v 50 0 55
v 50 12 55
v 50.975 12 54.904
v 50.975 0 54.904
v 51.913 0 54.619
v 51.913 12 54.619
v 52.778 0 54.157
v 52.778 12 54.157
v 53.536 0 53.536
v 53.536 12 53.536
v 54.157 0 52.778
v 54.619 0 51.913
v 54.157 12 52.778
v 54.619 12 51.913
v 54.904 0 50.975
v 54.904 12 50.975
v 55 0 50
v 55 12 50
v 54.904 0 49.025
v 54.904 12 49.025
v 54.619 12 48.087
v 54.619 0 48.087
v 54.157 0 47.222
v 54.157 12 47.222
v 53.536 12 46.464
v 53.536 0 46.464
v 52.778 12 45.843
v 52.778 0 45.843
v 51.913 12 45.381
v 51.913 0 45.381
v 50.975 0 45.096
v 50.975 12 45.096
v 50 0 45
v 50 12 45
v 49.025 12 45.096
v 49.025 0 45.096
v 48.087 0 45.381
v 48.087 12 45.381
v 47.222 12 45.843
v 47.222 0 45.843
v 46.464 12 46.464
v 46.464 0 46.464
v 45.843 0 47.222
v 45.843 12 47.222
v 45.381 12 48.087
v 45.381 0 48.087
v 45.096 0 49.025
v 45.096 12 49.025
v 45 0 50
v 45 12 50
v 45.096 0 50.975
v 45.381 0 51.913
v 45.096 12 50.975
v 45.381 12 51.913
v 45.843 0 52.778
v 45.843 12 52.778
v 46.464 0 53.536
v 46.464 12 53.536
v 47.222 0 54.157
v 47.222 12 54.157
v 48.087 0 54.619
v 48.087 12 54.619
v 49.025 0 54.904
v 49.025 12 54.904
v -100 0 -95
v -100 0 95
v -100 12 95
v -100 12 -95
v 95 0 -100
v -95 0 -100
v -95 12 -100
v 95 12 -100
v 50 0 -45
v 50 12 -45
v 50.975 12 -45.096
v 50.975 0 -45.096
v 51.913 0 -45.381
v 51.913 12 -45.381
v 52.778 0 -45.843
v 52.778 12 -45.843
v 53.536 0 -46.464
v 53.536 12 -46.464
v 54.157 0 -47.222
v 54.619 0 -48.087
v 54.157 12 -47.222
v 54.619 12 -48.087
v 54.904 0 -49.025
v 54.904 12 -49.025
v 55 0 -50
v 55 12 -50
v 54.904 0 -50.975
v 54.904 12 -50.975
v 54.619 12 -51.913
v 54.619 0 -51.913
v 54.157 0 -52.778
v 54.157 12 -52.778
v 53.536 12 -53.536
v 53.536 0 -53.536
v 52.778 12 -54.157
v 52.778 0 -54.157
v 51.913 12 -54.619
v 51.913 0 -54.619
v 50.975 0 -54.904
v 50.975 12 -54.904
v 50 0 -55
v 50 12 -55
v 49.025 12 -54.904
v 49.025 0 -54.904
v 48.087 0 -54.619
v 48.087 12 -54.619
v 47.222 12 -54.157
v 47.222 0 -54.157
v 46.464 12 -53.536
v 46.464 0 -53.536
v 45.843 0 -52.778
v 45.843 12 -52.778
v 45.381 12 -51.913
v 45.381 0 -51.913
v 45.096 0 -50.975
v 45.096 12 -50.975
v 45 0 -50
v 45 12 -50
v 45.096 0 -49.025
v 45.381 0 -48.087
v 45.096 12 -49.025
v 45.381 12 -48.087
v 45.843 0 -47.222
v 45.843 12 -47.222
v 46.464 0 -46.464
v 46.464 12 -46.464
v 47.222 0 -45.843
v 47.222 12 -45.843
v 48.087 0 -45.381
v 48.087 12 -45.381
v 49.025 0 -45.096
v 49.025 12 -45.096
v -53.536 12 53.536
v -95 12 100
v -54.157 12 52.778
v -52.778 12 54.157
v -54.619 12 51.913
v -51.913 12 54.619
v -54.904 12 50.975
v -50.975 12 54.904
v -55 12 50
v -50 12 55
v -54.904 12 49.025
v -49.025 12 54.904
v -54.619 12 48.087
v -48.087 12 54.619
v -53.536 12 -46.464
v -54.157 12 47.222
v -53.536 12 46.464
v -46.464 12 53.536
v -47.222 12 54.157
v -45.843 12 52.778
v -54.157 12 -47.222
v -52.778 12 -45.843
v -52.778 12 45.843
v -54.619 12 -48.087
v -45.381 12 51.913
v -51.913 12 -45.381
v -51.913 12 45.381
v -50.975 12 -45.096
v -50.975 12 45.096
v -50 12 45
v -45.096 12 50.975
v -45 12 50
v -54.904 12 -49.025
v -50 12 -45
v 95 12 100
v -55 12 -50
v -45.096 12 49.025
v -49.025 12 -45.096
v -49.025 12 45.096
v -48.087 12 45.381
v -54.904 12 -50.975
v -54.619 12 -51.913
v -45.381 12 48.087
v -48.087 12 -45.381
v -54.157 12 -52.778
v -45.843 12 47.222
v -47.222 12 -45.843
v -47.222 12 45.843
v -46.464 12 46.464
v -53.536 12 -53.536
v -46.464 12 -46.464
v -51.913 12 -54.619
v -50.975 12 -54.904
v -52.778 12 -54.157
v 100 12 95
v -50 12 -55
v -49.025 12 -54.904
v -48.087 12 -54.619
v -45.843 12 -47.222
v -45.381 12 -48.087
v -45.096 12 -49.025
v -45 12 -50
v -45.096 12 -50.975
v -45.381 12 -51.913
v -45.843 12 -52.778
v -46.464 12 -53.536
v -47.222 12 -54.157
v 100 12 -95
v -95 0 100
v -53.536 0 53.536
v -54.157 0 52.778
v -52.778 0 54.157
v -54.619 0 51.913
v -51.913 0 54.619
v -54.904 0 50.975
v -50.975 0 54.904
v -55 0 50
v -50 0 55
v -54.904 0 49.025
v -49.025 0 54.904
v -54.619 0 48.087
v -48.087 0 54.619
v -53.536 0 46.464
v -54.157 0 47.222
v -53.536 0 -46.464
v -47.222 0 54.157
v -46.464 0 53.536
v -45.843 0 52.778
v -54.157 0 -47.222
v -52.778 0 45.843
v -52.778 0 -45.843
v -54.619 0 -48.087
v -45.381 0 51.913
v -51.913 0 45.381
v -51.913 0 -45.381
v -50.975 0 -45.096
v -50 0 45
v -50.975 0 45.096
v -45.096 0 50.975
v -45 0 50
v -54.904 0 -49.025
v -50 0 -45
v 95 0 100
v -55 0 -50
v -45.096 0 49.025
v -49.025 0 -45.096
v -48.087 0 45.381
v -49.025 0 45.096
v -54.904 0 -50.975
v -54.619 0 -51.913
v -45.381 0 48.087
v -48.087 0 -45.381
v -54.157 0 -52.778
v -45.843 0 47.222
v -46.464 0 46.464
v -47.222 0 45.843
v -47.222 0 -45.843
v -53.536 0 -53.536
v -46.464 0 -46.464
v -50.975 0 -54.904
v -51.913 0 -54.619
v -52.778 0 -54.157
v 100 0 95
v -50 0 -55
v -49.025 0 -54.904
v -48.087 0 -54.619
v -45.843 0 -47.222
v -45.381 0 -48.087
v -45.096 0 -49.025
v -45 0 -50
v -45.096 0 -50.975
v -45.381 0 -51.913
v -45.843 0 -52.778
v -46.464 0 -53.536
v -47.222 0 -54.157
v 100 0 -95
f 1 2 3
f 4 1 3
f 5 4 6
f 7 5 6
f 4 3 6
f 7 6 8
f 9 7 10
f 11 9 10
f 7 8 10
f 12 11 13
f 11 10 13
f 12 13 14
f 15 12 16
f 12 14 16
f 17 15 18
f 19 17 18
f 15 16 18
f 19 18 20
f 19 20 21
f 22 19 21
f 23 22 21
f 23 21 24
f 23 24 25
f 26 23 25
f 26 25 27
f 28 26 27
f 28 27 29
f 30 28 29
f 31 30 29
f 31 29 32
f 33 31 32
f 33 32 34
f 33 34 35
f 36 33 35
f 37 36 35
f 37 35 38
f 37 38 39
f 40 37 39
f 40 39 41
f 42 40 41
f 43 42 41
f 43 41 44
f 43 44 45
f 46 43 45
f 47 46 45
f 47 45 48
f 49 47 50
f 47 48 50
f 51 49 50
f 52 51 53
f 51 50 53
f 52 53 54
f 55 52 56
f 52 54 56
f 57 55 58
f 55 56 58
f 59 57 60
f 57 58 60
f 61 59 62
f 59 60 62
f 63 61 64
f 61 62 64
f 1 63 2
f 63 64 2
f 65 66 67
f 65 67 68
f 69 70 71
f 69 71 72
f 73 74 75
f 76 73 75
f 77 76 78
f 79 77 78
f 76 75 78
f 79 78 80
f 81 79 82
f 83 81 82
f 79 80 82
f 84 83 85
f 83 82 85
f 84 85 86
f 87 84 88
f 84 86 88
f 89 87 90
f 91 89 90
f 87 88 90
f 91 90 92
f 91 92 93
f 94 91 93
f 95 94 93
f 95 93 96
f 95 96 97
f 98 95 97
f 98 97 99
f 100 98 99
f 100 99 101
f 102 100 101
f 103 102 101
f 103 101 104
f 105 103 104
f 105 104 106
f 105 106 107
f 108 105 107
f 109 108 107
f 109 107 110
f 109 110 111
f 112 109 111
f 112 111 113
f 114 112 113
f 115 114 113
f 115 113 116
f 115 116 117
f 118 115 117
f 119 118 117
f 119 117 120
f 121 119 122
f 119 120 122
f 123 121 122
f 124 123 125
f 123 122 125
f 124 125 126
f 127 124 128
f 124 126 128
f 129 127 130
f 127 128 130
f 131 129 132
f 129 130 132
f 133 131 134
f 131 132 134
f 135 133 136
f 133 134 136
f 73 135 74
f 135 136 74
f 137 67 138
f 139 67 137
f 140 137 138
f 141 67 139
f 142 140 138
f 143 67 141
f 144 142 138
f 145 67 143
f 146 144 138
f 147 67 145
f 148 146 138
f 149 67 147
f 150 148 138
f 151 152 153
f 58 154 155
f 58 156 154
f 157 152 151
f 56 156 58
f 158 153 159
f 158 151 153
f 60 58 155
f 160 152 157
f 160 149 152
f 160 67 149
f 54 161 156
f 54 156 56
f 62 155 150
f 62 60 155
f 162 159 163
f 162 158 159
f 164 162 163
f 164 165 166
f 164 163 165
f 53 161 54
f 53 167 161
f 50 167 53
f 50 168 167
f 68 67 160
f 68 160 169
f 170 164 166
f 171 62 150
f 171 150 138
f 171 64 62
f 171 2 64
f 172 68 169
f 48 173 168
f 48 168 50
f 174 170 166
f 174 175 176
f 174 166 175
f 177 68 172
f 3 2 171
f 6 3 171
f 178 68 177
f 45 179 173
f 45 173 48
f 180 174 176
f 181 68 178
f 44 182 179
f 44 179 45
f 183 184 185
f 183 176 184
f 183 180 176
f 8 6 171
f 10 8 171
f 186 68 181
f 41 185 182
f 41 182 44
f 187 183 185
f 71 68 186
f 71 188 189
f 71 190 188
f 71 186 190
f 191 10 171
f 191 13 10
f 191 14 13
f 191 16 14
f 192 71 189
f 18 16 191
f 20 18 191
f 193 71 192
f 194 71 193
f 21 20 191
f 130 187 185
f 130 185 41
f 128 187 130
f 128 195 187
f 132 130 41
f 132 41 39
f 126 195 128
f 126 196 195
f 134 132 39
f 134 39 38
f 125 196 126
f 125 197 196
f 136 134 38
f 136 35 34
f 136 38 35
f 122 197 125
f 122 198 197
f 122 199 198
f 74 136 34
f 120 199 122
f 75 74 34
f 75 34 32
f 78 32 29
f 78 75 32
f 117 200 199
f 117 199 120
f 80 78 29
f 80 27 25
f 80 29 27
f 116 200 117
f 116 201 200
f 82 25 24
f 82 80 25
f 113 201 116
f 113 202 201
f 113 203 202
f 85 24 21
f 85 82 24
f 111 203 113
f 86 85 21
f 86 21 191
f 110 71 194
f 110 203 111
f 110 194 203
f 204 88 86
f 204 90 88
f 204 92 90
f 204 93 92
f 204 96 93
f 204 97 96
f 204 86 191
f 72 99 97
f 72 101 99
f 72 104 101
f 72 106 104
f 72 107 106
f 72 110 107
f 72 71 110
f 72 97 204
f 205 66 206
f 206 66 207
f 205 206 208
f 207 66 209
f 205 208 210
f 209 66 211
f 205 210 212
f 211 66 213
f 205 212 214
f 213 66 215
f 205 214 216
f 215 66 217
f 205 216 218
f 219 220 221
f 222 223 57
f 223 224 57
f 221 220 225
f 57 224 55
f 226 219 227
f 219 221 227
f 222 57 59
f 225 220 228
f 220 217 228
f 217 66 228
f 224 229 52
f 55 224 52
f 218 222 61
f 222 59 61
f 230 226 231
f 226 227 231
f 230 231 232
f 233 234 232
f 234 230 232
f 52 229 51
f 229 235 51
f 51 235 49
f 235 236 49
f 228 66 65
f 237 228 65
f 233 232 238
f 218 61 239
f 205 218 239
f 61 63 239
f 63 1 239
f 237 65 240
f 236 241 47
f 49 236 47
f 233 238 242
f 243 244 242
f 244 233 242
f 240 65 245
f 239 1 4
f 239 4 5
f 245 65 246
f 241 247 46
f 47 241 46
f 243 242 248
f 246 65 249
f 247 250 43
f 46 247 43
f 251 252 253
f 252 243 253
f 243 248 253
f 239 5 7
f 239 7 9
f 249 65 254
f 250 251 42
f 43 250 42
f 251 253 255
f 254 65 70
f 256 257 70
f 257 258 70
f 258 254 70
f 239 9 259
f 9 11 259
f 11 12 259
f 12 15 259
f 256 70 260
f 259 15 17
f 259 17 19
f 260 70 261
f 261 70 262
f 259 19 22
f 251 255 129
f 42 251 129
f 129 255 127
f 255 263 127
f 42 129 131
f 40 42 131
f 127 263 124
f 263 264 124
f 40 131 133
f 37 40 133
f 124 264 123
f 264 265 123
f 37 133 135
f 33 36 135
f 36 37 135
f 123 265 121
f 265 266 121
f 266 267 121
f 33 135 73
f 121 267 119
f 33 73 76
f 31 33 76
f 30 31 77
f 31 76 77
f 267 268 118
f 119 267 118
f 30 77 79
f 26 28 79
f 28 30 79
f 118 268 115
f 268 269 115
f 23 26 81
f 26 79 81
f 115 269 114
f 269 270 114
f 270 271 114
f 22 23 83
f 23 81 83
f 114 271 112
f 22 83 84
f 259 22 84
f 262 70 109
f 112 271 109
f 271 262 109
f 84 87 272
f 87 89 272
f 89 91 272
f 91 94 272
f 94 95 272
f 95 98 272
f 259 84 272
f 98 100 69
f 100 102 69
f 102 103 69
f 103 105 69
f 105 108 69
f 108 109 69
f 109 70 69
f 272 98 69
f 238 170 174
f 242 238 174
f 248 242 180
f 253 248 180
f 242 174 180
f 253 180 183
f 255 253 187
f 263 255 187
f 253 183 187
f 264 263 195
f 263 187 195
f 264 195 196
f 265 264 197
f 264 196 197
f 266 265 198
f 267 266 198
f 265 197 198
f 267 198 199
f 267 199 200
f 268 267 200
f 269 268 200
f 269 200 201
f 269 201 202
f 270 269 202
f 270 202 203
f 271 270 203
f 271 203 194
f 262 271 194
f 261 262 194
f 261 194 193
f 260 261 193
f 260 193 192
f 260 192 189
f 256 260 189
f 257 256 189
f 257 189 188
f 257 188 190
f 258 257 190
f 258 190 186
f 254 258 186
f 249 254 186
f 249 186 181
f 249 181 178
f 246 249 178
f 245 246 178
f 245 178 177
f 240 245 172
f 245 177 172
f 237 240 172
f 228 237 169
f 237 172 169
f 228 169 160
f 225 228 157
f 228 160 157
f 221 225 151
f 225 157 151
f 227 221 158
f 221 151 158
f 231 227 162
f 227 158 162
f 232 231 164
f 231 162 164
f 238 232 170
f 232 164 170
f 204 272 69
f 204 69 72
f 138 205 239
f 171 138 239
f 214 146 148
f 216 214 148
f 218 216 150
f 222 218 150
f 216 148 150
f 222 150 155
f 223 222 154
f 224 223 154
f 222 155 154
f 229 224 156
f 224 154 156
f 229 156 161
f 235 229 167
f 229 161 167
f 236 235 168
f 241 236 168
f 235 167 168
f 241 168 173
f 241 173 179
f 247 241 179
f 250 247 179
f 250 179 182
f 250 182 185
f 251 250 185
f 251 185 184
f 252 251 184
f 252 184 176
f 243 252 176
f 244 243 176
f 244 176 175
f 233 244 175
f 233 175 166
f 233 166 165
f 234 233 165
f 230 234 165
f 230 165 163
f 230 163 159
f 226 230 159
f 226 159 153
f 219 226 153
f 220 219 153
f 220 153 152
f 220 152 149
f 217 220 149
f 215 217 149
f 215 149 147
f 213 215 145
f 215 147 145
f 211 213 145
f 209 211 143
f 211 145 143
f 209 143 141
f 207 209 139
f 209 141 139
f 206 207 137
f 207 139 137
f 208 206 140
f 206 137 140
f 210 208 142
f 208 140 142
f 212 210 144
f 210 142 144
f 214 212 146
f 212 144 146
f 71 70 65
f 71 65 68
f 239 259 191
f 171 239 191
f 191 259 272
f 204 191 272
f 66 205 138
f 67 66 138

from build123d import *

# Parameters (mm, degrees)
SKETCH1_W           = 200
SKETCH1_H           = 200
BOSS_EXTRUDE1_DEPTH = 12
CUT_EXTRUDE2_REACH  = 143.93
SKETCH3_R           = 5
CHAMFER1_SIZE       = 5


with BuildPart() as part:
    # Sketch1 → Boss-Extrude1 (new body)
    with BuildSketch(Plane(origin=(0, 0, 0), x_dir=(1, 0, 0), z_dir=(0, 1, 0))):
        Rectangle(SKETCH1_W, SKETCH1_H)
    extrude(amount=BOSS_EXTRUDE1_DEPTH)

    # Sketch3 → Cut-Extrude2 (cut, up to next)
    with BuildSketch(Plane(origin=(0, 12, 0), x_dir=(1, 0, 0), z_dir=(0, 1, 0)), mode=Mode.PRIVATE) as cut_extrude2_sk1:
        with Locations(Location((-50, 50, 0), (0, 0, 270))):
            Circle(SKETCH3_R)
    cut_extrude2_tool1 = extrude(cut_extrude2_sk1.sketch, amount=-CUT_EXTRUDE2_REACH, mode=Mode.PRIVATE) & part.part
    # Sketch3 → Cut-Extrude2 (cut, up to next)
    with BuildSketch(Plane(origin=(0, 12, 0), x_dir=(1, 0, 0), z_dir=(0, 1, 0)), mode=Mode.PRIVATE) as cut_extrude2_sk2:
        with Locations(Location((50, 50, 0), (0, 0, 270))):
            Circle(SKETCH3_R)
    cut_extrude2_tool2 = extrude(cut_extrude2_sk2.sketch, amount=-CUT_EXTRUDE2_REACH, mode=Mode.PRIVATE) & part.part
    # Sketch3 → Cut-Extrude2 (cut, up to next)
    with BuildSketch(Plane(origin=(0, 12, 0), x_dir=(1, 0, 0), z_dir=(0, 1, 0)), mode=Mode.PRIVATE) as cut_extrude2_sk3:
        with Locations(Location((-50, -50, 0), (0, 0, 270))):
            Circle(SKETCH3_R)
    cut_extrude2_tool3 = extrude(cut_extrude2_sk3.sketch, amount=-CUT_EXTRUDE2_REACH, mode=Mode.PRIVATE) & part.part
    # Sketch3 → Cut-Extrude2 (cut, up to next)
    with BuildSketch(Plane(origin=(0, 12, 0), x_dir=(1, 0, 0), z_dir=(0, 1, 0)), mode=Mode.PRIVATE) as cut_extrude2_sk4:
        with Locations(Location((50, -50, 0), (0, 0, 270))):
            Circle(SKETCH3_R)
    cut_extrude2_tool4 = extrude(cut_extrude2_sk4.sketch, amount=-CUT_EXTRUDE2_REACH, mode=Mode.PRIVATE) & part.part
    add(cut_extrude2_tool1.solids().sort_by_distance((-50, 12, -50))[0], mode=Mode.SUBTRACT)
    add(cut_extrude2_tool2.solids().sort_by_distance((50, 12, -50))[0], mode=Mode.SUBTRACT)
    add(cut_extrude2_tool3.solids().sort_by_distance((-50, 12, 50))[0], mode=Mode.SUBTRACT)
    add(cut_extrude2_tool4.solids().sort_by_distance((50, 12, 50))[0], mode=Mode.SUBTRACT)

    # Chamfer1
    chamfer1_edges = [part.edges().sort_by_distance(p)[0] for p in [
        (-100, 6, -100),
        (100, 6, -100),
        (100, 6, 100),
        (-100, 6, 100),
    ]]
    chamfer(chamfer1_edges, length=CHAMFER1_SIZE)


solid = part.part
